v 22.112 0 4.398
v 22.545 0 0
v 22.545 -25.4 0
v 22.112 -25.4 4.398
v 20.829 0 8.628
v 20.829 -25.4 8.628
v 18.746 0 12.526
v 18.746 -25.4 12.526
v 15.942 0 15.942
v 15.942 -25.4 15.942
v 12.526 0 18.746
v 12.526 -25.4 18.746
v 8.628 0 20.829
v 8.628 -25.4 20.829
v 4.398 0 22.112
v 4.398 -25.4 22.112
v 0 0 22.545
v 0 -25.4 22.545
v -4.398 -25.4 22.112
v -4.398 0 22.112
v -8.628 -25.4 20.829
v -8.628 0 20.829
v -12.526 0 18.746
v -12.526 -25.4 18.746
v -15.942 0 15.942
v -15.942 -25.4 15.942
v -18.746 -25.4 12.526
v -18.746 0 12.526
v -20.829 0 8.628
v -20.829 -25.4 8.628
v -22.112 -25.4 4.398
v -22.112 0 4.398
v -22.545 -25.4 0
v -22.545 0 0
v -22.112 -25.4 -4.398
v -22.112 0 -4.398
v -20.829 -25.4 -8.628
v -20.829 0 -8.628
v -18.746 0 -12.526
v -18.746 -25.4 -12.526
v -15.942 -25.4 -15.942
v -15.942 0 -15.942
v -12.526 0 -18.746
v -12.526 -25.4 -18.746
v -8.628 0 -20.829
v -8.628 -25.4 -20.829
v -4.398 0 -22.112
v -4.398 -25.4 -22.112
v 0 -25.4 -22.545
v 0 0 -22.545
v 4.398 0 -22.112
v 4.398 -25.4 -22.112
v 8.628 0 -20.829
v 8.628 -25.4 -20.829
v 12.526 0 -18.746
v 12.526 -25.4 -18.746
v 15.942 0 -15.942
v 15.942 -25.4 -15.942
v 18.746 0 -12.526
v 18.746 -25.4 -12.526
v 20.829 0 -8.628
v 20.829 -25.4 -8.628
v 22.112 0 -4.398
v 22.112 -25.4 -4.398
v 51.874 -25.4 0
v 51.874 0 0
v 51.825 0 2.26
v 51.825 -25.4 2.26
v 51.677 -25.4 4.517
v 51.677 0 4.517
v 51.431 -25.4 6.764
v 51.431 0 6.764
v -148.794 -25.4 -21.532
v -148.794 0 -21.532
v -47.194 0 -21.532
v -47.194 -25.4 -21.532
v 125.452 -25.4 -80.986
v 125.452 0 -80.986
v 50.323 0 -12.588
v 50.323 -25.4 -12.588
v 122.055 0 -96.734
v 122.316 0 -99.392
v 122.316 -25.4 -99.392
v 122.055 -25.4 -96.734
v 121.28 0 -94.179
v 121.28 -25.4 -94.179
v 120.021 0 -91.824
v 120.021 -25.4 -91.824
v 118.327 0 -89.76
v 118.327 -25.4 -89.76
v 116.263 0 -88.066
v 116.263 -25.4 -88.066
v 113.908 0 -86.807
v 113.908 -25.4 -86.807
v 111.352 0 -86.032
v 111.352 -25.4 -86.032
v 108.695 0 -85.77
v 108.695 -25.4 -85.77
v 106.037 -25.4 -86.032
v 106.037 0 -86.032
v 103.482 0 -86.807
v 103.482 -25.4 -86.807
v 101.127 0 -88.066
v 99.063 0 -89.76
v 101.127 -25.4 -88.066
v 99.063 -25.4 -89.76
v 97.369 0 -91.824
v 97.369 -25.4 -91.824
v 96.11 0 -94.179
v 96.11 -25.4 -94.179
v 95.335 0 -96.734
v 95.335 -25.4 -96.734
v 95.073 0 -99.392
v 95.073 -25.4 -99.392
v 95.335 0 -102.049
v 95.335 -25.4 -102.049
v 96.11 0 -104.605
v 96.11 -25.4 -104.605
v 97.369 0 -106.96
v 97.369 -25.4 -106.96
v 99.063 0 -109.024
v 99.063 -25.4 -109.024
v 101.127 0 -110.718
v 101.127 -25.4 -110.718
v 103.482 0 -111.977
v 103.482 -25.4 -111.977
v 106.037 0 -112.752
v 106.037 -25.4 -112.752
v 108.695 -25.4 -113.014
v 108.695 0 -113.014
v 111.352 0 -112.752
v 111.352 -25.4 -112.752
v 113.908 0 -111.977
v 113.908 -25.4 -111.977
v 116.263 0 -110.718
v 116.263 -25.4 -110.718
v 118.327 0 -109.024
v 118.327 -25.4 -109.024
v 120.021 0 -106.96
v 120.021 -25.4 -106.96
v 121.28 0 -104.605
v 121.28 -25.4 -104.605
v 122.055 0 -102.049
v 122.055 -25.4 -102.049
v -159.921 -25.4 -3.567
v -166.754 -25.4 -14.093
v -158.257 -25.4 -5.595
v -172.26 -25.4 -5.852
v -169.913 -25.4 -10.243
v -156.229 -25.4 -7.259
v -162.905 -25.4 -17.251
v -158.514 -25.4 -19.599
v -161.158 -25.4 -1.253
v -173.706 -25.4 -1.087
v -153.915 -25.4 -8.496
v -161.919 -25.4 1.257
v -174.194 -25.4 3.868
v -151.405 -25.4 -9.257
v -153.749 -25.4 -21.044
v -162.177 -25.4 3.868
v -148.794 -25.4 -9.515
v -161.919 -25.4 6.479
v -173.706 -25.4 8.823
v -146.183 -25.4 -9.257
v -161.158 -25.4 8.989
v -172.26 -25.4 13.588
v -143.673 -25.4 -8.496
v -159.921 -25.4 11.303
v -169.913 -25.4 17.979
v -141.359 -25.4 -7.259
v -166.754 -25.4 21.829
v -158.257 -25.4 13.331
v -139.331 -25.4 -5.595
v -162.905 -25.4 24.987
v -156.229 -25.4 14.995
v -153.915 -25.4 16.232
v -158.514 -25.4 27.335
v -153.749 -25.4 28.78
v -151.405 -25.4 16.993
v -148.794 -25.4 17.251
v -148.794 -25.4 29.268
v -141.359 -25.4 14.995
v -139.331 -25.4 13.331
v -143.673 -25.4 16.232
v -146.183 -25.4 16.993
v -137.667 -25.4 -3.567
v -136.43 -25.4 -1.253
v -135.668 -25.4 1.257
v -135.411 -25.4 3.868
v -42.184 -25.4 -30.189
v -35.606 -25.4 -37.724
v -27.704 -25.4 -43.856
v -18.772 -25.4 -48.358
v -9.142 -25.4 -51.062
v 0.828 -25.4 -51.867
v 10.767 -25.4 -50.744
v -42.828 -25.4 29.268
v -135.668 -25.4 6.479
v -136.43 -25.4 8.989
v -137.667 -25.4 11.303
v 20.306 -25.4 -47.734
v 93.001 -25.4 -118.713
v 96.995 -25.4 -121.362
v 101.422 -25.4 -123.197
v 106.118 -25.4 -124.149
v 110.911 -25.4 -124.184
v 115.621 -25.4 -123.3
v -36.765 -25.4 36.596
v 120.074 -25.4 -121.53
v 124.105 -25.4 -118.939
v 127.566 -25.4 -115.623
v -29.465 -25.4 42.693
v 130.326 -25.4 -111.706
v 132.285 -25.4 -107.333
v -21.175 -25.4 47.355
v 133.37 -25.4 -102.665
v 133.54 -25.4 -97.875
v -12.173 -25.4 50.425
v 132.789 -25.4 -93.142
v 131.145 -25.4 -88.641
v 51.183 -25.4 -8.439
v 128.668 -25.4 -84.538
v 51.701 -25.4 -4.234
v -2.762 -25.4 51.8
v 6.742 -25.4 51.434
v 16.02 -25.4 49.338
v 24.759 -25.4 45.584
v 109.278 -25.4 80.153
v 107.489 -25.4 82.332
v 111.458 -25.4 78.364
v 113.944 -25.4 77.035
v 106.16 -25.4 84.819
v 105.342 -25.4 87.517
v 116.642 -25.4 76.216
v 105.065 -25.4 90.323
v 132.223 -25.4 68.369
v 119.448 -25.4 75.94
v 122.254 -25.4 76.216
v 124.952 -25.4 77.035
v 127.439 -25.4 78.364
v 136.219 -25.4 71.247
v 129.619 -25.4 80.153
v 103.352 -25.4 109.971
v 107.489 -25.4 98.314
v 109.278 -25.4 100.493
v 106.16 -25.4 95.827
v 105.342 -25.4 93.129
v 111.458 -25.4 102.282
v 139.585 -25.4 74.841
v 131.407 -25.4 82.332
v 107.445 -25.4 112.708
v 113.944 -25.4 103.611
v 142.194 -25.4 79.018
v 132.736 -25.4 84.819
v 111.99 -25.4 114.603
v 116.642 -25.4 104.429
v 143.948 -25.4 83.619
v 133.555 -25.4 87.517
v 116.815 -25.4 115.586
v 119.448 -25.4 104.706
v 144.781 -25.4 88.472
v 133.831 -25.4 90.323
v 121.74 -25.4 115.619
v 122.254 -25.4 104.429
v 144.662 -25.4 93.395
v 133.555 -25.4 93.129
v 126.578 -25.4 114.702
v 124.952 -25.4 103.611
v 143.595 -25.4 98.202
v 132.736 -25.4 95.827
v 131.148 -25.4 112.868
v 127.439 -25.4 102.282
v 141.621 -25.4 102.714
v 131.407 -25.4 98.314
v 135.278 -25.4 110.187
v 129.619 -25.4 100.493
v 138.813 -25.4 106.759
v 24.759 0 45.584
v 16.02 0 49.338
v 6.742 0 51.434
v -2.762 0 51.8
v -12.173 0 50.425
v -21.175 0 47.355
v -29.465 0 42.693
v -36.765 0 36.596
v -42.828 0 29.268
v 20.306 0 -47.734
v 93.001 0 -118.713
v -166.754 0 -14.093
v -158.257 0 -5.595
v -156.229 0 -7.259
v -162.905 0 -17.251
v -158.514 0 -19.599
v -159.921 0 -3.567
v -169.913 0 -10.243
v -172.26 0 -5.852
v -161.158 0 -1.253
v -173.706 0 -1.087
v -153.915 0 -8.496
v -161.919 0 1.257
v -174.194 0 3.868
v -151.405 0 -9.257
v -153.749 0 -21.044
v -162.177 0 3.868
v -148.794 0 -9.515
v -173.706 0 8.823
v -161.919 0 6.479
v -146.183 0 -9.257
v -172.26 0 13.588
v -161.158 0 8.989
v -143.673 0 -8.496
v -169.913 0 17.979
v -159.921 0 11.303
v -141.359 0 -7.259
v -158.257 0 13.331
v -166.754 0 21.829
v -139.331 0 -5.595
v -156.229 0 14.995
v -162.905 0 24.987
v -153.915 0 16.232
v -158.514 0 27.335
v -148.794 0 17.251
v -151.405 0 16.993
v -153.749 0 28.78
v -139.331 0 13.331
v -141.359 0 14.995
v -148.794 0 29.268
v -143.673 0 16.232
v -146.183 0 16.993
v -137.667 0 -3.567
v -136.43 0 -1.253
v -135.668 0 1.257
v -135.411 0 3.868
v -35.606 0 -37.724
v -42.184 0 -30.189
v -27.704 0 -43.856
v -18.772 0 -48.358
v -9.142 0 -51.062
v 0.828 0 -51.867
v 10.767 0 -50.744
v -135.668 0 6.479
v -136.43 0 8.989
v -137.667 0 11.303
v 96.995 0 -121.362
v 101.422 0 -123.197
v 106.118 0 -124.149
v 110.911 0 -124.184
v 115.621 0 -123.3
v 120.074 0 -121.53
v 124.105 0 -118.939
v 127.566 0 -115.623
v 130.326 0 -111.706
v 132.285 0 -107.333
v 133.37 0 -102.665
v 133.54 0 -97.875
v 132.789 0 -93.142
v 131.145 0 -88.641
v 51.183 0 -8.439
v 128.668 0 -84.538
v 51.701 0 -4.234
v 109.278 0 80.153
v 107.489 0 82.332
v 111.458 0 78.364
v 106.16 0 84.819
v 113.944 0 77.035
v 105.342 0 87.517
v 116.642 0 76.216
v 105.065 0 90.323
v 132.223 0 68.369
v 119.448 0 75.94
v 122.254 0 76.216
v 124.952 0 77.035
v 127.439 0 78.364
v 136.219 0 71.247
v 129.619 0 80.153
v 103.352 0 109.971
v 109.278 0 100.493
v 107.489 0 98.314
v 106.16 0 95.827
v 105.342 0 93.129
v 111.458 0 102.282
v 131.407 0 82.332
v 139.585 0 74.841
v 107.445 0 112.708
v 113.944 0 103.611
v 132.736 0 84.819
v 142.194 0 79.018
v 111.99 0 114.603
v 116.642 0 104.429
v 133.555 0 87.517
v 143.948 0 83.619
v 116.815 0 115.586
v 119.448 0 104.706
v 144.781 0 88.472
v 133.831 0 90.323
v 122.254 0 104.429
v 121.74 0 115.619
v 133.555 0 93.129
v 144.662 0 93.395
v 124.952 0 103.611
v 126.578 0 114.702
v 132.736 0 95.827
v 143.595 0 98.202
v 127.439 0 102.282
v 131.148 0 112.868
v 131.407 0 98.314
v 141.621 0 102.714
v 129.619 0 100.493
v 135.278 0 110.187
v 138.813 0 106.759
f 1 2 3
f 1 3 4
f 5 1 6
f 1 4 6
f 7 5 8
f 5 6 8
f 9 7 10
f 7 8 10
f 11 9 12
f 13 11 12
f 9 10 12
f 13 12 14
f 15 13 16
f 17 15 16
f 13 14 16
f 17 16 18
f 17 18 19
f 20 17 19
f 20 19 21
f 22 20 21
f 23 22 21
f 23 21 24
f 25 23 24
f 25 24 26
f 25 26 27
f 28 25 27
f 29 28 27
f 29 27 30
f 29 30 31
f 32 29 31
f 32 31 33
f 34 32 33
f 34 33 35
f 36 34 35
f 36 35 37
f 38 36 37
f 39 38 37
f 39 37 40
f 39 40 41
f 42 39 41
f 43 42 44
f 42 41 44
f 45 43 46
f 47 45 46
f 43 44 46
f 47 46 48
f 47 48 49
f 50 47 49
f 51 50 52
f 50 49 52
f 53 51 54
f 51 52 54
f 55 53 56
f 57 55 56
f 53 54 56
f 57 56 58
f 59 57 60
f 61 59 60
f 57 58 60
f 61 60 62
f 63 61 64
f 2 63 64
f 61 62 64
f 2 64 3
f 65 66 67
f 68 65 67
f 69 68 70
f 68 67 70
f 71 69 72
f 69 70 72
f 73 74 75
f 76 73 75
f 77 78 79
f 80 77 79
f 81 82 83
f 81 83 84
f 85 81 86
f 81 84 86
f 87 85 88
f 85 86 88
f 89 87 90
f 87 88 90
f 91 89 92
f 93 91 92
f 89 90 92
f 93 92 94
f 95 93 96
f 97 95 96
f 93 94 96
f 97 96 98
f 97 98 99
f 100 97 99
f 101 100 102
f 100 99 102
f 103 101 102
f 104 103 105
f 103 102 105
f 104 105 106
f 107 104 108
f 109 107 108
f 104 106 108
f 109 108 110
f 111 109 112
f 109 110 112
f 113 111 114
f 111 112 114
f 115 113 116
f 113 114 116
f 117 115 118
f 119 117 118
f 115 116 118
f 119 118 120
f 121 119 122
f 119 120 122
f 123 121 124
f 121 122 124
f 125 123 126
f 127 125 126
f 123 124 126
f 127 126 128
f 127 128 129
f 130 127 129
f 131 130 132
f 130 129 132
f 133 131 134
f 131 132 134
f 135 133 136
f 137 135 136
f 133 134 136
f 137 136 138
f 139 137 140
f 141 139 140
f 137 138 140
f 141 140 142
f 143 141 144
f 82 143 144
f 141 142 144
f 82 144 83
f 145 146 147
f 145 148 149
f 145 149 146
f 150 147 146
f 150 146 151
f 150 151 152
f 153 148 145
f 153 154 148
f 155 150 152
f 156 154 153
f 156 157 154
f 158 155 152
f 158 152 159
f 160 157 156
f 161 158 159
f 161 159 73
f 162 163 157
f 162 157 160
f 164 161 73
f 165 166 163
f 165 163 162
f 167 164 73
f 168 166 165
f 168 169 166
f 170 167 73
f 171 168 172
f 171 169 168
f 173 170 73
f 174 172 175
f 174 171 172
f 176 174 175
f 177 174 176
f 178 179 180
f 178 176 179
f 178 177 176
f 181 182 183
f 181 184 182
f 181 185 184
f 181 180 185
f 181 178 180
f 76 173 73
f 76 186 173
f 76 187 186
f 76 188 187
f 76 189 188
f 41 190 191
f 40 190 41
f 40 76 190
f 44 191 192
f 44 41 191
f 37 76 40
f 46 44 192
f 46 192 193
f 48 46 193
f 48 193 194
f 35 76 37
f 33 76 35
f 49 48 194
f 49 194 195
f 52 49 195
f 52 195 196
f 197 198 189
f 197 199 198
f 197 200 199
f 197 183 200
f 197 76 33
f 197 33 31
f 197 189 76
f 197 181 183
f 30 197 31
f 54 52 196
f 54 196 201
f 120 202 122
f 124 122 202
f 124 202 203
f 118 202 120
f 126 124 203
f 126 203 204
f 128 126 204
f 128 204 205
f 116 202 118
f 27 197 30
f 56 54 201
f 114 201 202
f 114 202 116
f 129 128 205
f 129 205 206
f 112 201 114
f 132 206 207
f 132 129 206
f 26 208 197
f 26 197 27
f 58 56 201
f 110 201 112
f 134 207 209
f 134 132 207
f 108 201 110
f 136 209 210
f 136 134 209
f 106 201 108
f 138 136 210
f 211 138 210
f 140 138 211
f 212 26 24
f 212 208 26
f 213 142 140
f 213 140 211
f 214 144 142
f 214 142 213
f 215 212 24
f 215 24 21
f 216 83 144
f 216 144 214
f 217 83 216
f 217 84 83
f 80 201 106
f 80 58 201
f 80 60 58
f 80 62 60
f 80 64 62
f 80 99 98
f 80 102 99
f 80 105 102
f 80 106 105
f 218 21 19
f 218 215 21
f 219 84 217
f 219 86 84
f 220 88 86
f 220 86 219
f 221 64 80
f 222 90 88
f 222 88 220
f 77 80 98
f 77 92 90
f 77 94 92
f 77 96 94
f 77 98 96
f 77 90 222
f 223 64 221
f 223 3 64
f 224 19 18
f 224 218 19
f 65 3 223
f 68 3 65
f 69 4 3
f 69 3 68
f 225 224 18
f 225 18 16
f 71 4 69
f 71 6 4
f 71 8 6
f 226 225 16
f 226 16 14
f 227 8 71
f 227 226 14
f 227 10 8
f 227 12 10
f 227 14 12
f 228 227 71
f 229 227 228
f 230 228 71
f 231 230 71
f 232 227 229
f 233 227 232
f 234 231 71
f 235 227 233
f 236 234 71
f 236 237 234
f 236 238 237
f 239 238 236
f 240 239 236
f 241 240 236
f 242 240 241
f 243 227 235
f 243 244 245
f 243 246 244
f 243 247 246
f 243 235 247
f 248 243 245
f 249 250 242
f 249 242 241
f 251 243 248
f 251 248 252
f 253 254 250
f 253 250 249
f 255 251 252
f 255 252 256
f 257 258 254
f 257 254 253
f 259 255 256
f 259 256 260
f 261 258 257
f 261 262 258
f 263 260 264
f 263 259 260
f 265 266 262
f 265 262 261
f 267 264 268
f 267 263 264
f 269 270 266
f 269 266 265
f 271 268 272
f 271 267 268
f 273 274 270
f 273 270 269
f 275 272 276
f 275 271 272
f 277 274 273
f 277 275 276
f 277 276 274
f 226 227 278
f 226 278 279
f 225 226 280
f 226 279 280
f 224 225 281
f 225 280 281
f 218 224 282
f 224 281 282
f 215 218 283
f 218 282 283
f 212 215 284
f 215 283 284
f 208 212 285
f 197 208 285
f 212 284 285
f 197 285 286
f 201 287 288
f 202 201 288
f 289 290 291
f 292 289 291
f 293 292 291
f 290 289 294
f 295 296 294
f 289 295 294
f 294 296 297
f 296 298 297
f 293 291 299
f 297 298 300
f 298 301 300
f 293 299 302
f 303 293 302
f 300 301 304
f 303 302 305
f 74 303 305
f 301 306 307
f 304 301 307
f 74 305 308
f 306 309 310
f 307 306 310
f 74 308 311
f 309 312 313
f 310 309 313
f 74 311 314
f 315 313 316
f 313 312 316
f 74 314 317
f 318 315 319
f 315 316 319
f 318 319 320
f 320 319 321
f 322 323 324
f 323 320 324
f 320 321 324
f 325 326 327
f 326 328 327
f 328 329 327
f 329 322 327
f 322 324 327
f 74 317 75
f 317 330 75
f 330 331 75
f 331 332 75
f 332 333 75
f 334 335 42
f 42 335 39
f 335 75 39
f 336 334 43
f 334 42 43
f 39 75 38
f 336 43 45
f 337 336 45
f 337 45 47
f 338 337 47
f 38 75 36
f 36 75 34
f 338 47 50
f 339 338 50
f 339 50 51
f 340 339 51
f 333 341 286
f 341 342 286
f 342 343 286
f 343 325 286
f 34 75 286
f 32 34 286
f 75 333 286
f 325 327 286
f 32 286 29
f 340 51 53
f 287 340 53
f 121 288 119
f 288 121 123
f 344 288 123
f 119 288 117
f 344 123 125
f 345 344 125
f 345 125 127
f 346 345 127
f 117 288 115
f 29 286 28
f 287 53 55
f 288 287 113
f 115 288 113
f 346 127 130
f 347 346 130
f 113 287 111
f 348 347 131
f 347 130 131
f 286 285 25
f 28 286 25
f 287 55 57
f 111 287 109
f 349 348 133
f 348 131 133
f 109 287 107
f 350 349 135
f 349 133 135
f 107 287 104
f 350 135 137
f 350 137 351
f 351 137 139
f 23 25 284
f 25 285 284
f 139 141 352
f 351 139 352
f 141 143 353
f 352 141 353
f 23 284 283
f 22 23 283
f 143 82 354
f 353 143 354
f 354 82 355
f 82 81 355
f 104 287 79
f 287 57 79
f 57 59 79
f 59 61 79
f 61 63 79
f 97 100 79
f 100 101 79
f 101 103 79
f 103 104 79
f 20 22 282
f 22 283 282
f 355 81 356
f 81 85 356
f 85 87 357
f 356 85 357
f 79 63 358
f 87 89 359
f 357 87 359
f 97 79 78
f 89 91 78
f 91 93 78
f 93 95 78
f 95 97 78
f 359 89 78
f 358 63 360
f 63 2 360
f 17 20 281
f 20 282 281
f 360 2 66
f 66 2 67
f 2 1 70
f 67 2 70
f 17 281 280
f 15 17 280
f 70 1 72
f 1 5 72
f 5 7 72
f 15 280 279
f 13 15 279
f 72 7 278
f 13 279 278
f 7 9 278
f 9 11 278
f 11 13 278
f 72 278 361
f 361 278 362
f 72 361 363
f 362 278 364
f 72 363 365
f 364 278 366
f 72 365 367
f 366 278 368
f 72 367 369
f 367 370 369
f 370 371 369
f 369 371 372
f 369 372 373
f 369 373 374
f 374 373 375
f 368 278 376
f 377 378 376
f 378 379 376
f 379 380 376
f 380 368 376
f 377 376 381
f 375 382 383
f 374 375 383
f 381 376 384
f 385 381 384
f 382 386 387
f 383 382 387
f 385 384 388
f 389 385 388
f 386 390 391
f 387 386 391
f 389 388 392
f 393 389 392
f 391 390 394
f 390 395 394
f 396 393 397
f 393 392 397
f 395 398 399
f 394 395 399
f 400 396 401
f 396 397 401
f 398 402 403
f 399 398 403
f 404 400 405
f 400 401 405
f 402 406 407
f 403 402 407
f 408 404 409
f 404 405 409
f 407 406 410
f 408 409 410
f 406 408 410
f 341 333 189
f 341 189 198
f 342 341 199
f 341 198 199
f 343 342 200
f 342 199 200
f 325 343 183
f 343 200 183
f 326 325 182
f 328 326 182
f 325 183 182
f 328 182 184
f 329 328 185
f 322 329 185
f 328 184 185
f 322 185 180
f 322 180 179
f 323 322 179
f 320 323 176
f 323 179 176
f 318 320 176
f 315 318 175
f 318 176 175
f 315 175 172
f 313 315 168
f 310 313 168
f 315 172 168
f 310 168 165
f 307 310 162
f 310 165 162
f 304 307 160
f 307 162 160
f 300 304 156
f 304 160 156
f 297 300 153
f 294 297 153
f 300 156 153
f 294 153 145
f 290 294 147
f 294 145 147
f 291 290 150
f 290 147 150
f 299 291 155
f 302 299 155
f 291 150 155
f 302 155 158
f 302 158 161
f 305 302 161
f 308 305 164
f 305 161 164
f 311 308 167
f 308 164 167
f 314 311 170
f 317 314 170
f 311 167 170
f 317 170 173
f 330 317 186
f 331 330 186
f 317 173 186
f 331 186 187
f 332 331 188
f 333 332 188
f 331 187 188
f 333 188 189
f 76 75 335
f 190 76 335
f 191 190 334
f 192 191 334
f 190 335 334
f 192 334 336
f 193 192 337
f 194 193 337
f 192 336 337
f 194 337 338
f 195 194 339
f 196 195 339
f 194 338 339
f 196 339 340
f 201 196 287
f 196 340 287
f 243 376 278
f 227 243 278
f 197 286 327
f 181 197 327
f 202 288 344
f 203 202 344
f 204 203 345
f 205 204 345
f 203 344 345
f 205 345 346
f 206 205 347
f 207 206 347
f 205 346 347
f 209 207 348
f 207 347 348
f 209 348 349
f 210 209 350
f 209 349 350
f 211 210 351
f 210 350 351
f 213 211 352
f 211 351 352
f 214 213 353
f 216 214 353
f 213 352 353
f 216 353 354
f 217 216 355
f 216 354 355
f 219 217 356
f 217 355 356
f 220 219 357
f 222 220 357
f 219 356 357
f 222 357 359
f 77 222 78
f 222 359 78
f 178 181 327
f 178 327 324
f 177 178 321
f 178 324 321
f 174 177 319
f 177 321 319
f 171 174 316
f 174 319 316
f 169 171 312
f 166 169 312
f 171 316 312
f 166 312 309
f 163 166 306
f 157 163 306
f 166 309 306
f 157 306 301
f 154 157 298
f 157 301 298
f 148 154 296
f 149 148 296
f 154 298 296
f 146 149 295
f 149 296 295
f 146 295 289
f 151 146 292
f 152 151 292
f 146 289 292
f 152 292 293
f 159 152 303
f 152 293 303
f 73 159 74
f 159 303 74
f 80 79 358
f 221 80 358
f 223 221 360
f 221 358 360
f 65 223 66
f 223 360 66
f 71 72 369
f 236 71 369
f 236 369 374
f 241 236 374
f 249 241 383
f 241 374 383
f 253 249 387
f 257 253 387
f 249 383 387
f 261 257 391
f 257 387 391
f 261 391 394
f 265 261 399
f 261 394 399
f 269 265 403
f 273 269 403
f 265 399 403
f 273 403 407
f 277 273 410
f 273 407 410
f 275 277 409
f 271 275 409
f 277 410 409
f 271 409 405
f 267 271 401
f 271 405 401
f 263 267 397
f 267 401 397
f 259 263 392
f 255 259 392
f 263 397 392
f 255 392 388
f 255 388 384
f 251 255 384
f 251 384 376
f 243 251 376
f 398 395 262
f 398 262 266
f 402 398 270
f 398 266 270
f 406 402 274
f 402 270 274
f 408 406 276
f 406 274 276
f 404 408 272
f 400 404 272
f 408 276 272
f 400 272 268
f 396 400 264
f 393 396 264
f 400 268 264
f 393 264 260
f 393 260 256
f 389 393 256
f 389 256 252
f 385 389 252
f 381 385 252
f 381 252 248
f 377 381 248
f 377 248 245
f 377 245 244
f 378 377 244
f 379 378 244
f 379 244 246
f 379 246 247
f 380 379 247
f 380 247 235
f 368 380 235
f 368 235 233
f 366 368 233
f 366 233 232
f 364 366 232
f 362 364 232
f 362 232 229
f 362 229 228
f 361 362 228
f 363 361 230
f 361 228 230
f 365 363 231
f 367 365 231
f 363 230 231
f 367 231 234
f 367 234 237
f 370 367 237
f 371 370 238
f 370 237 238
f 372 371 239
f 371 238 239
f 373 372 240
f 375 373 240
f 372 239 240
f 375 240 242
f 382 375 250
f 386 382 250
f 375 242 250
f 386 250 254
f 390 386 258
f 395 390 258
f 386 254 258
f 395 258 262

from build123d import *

# Parameters (mm, degrees)
F1_DEPTH  = 25.4
F2_R      = 22.5453784596
F3_DEPTH  = 25.401
F4_R      = 15.5169822629
F4_R_2    = 14.6151483758
F4_R_3    = 13.5851891759
F5_DEPTH  = 419
F6_R      = 14.3828522328
F7_DEPTH  = 25.401
F8_R      = 13.6217726984
F9_DEPTH  = 25.4
F10_R     = 13.3826357349
F11_DEPTH = 25.4


# Not quite as in the source:
# - an extrude ends at something that could not be found from the text; its depth is read off the source's solid


with BuildPart() as f1:
    # F0 (on Front) → F1 (new body)
    with BuildSketch(Plane.XZ):
        with BuildLine():
            ThreePointArc((50.3233435561, -12.5877974986), (51.4847298632, -6.3414622483), (51.873804107, 0))
            ThreePointArc((51.873804107, 0), (51.7629612184, 3.3893064834), (51.4309062461, 6.7641285647))
            ThreePointArc((51.4309062461, 6.7641285647), (42.7546046022, 29.3757610599), (24.7585971482, 45.5840259278))
            ThreePointArc((24.7585971482, 45.5840259278), (-12.1730496974, 50.4252755431), (-42.8284505735, 29.2679923125))
            ThreePointArc((-42.8284505735, 29.2679923125), (-51.683323237, 4.4413569672), (-47.1939000029, -21.5320076875))
            ThreePointArc((-47.1939000029, -21.5320076875), (-18.7719046051, -48.3581135905), (20.3057196076, -47.7343618764))
            ThreePointArc((20.3057196076, -47.7343618764), (39.4453595209, -33.6890956364), (50.3233435561, -12.5877974986))
        make_face()
        with BuildLine():
            ThreePointArc((24.7585971482, 45.5840259278), (42.7546046022, 29.3757610599), (51.4309062461, 6.7641285647))
            Line((51.4309062461, 6.7641285647), (132.2230654066, 68.3692177878))
            ThreePointArc((132.2230654066, 68.3692177878), (140.3155469651, 104.8046621717), (103.3515533001, 109.9711926872))
            Line((103.3515533001, 109.9711926872), (24.7585971482, 45.5840259278))
        make_face()
        with BuildLine():
            Line((125.4517560768, -80.9857626154), (50.3233435561, -12.5877974986))
            ThreePointArc((50.3233435561, -12.5877974986), (39.4453595209, -33.6890956364), (20.3057196076, -47.7343618764))
            Line((20.3057196076, -47.7343618764), (93.0013113713, -118.7126045859))
            ThreePointArc((93.0013113713, -118.7126045859), (127.5656184462, -115.6234022642), (125.4517560768, -80.9857626154))
        make_face()
        with BuildLine():
            ThreePointArc((-47.1939000029, -21.5320076875), (-51.683323237, 4.4413569672), (-42.8284505735, 29.2679923125))
            Line((-42.8284505735, 29.2679923125), (-148.7939000029, 29.2679923125))
            ThreePointArc((-148.7939000029, 29.2679923125), (-174.1939000029, 3.8679923125), (-148.7939000029, -21.5320076875))
            Line((-148.7939000029, -21.5320076875), (-47.1939000029, -21.5320076875))
        make_face()
    extrude(amount=F1_DEPTH)

    # F2 (on face) → F3 (cut, through all)
    with BuildSketch(Plane.XZ.offset(25.4)):
        Circle(F2_R)
    extrude(amount=-F3_DEPTH, mode=Mode.SUBTRACT)

    # F4 (on face) → F5 (cut, through all)
    with BuildSketch(Plane.XZ.offset(25.4)):
        with Locations((119.4483449899, 90.3229536493)):
            Circle(F4_R)
        with Locations((108.694701762, -99.3917325452)):
            Circle(F4_R_2)
        with Locations((-148.7939000029, 3.8679923125)):
            Circle(F4_R_3)
    extrude(amount=F5_DEPTH, mode=Mode.SUBTRACT)

    # F6 (on face) → F7 (cut, through all)
    with BuildSketch(Plane.XZ.offset(25.4)):
        with Locations((119.4483449899, 90.3229536493)):
            Circle(F6_R)
    extrude(amount=-F7_DEPTH, mode=Mode.SUBTRACT)

    # F8 (on face) → F9 (cut)
    with BuildSketch(Plane.XZ.offset(25.4)):
        with Locations((108.694701762, -99.3917325452)):
            Circle(F8_R)
    extrude(amount=-F9_DEPTH, mode=Mode.SUBTRACT)

    # F10 (on face) → F11 (cut)
    with BuildSketch(Plane.XZ.offset(25.4)):
        with Locations((-148.7939000029, 3.8679923125)):
            Circle(F10_R)
    extrude(amount=-F11_DEPTH, mode=Mode.SUBTRACT)


solid = f1.part
